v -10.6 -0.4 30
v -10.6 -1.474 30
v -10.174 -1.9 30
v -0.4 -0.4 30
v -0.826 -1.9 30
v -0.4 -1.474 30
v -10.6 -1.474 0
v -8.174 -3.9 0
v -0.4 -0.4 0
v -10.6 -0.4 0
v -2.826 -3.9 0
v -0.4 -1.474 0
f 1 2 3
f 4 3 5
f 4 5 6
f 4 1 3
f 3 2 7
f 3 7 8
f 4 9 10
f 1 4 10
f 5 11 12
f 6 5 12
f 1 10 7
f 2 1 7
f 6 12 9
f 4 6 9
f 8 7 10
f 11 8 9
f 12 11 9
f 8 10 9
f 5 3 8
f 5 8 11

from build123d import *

# Parameters (mm, degrees)
F1_DEPTH = 30
F2_SIZE2 = 1.99999
F2_SIZE  = 29.99999


# Not quite as in the source:
# - a fillet or chamfer is up to 0.001 mm smaller than in the source, because OpenCascade refuses the exact size


with BuildPart() as f1:
    # F0 (on Top) → F1 (new body)
    with BuildSketch(Plane.XY):
        Polygon((-10.6, -0.4), (-10.6, -1.4736544004), (-8.1736544004, -3.9), (-2.8263455996, -3.9), (-0.4, -1.4736544004), (-0.4, -0.4), align=None)
    extrude(amount=F1_DEPTH)

    # F2 (size 30 and 2 in the source; OpenCascade refuses exactly that, so slightly less here)
    f2_edges = [f1.edges().sort_by_distance(p)[0] for p in [
        (-5.5, -3.9, 30),
    ]]
    f2_side = f1.faces().sort_by_distance((-5.5, -3.9, 15))[0]
    chamfer(f2_edges, length=F2_SIZE, length2=F2_SIZE2, reference=f2_side)


solid = f1.part
